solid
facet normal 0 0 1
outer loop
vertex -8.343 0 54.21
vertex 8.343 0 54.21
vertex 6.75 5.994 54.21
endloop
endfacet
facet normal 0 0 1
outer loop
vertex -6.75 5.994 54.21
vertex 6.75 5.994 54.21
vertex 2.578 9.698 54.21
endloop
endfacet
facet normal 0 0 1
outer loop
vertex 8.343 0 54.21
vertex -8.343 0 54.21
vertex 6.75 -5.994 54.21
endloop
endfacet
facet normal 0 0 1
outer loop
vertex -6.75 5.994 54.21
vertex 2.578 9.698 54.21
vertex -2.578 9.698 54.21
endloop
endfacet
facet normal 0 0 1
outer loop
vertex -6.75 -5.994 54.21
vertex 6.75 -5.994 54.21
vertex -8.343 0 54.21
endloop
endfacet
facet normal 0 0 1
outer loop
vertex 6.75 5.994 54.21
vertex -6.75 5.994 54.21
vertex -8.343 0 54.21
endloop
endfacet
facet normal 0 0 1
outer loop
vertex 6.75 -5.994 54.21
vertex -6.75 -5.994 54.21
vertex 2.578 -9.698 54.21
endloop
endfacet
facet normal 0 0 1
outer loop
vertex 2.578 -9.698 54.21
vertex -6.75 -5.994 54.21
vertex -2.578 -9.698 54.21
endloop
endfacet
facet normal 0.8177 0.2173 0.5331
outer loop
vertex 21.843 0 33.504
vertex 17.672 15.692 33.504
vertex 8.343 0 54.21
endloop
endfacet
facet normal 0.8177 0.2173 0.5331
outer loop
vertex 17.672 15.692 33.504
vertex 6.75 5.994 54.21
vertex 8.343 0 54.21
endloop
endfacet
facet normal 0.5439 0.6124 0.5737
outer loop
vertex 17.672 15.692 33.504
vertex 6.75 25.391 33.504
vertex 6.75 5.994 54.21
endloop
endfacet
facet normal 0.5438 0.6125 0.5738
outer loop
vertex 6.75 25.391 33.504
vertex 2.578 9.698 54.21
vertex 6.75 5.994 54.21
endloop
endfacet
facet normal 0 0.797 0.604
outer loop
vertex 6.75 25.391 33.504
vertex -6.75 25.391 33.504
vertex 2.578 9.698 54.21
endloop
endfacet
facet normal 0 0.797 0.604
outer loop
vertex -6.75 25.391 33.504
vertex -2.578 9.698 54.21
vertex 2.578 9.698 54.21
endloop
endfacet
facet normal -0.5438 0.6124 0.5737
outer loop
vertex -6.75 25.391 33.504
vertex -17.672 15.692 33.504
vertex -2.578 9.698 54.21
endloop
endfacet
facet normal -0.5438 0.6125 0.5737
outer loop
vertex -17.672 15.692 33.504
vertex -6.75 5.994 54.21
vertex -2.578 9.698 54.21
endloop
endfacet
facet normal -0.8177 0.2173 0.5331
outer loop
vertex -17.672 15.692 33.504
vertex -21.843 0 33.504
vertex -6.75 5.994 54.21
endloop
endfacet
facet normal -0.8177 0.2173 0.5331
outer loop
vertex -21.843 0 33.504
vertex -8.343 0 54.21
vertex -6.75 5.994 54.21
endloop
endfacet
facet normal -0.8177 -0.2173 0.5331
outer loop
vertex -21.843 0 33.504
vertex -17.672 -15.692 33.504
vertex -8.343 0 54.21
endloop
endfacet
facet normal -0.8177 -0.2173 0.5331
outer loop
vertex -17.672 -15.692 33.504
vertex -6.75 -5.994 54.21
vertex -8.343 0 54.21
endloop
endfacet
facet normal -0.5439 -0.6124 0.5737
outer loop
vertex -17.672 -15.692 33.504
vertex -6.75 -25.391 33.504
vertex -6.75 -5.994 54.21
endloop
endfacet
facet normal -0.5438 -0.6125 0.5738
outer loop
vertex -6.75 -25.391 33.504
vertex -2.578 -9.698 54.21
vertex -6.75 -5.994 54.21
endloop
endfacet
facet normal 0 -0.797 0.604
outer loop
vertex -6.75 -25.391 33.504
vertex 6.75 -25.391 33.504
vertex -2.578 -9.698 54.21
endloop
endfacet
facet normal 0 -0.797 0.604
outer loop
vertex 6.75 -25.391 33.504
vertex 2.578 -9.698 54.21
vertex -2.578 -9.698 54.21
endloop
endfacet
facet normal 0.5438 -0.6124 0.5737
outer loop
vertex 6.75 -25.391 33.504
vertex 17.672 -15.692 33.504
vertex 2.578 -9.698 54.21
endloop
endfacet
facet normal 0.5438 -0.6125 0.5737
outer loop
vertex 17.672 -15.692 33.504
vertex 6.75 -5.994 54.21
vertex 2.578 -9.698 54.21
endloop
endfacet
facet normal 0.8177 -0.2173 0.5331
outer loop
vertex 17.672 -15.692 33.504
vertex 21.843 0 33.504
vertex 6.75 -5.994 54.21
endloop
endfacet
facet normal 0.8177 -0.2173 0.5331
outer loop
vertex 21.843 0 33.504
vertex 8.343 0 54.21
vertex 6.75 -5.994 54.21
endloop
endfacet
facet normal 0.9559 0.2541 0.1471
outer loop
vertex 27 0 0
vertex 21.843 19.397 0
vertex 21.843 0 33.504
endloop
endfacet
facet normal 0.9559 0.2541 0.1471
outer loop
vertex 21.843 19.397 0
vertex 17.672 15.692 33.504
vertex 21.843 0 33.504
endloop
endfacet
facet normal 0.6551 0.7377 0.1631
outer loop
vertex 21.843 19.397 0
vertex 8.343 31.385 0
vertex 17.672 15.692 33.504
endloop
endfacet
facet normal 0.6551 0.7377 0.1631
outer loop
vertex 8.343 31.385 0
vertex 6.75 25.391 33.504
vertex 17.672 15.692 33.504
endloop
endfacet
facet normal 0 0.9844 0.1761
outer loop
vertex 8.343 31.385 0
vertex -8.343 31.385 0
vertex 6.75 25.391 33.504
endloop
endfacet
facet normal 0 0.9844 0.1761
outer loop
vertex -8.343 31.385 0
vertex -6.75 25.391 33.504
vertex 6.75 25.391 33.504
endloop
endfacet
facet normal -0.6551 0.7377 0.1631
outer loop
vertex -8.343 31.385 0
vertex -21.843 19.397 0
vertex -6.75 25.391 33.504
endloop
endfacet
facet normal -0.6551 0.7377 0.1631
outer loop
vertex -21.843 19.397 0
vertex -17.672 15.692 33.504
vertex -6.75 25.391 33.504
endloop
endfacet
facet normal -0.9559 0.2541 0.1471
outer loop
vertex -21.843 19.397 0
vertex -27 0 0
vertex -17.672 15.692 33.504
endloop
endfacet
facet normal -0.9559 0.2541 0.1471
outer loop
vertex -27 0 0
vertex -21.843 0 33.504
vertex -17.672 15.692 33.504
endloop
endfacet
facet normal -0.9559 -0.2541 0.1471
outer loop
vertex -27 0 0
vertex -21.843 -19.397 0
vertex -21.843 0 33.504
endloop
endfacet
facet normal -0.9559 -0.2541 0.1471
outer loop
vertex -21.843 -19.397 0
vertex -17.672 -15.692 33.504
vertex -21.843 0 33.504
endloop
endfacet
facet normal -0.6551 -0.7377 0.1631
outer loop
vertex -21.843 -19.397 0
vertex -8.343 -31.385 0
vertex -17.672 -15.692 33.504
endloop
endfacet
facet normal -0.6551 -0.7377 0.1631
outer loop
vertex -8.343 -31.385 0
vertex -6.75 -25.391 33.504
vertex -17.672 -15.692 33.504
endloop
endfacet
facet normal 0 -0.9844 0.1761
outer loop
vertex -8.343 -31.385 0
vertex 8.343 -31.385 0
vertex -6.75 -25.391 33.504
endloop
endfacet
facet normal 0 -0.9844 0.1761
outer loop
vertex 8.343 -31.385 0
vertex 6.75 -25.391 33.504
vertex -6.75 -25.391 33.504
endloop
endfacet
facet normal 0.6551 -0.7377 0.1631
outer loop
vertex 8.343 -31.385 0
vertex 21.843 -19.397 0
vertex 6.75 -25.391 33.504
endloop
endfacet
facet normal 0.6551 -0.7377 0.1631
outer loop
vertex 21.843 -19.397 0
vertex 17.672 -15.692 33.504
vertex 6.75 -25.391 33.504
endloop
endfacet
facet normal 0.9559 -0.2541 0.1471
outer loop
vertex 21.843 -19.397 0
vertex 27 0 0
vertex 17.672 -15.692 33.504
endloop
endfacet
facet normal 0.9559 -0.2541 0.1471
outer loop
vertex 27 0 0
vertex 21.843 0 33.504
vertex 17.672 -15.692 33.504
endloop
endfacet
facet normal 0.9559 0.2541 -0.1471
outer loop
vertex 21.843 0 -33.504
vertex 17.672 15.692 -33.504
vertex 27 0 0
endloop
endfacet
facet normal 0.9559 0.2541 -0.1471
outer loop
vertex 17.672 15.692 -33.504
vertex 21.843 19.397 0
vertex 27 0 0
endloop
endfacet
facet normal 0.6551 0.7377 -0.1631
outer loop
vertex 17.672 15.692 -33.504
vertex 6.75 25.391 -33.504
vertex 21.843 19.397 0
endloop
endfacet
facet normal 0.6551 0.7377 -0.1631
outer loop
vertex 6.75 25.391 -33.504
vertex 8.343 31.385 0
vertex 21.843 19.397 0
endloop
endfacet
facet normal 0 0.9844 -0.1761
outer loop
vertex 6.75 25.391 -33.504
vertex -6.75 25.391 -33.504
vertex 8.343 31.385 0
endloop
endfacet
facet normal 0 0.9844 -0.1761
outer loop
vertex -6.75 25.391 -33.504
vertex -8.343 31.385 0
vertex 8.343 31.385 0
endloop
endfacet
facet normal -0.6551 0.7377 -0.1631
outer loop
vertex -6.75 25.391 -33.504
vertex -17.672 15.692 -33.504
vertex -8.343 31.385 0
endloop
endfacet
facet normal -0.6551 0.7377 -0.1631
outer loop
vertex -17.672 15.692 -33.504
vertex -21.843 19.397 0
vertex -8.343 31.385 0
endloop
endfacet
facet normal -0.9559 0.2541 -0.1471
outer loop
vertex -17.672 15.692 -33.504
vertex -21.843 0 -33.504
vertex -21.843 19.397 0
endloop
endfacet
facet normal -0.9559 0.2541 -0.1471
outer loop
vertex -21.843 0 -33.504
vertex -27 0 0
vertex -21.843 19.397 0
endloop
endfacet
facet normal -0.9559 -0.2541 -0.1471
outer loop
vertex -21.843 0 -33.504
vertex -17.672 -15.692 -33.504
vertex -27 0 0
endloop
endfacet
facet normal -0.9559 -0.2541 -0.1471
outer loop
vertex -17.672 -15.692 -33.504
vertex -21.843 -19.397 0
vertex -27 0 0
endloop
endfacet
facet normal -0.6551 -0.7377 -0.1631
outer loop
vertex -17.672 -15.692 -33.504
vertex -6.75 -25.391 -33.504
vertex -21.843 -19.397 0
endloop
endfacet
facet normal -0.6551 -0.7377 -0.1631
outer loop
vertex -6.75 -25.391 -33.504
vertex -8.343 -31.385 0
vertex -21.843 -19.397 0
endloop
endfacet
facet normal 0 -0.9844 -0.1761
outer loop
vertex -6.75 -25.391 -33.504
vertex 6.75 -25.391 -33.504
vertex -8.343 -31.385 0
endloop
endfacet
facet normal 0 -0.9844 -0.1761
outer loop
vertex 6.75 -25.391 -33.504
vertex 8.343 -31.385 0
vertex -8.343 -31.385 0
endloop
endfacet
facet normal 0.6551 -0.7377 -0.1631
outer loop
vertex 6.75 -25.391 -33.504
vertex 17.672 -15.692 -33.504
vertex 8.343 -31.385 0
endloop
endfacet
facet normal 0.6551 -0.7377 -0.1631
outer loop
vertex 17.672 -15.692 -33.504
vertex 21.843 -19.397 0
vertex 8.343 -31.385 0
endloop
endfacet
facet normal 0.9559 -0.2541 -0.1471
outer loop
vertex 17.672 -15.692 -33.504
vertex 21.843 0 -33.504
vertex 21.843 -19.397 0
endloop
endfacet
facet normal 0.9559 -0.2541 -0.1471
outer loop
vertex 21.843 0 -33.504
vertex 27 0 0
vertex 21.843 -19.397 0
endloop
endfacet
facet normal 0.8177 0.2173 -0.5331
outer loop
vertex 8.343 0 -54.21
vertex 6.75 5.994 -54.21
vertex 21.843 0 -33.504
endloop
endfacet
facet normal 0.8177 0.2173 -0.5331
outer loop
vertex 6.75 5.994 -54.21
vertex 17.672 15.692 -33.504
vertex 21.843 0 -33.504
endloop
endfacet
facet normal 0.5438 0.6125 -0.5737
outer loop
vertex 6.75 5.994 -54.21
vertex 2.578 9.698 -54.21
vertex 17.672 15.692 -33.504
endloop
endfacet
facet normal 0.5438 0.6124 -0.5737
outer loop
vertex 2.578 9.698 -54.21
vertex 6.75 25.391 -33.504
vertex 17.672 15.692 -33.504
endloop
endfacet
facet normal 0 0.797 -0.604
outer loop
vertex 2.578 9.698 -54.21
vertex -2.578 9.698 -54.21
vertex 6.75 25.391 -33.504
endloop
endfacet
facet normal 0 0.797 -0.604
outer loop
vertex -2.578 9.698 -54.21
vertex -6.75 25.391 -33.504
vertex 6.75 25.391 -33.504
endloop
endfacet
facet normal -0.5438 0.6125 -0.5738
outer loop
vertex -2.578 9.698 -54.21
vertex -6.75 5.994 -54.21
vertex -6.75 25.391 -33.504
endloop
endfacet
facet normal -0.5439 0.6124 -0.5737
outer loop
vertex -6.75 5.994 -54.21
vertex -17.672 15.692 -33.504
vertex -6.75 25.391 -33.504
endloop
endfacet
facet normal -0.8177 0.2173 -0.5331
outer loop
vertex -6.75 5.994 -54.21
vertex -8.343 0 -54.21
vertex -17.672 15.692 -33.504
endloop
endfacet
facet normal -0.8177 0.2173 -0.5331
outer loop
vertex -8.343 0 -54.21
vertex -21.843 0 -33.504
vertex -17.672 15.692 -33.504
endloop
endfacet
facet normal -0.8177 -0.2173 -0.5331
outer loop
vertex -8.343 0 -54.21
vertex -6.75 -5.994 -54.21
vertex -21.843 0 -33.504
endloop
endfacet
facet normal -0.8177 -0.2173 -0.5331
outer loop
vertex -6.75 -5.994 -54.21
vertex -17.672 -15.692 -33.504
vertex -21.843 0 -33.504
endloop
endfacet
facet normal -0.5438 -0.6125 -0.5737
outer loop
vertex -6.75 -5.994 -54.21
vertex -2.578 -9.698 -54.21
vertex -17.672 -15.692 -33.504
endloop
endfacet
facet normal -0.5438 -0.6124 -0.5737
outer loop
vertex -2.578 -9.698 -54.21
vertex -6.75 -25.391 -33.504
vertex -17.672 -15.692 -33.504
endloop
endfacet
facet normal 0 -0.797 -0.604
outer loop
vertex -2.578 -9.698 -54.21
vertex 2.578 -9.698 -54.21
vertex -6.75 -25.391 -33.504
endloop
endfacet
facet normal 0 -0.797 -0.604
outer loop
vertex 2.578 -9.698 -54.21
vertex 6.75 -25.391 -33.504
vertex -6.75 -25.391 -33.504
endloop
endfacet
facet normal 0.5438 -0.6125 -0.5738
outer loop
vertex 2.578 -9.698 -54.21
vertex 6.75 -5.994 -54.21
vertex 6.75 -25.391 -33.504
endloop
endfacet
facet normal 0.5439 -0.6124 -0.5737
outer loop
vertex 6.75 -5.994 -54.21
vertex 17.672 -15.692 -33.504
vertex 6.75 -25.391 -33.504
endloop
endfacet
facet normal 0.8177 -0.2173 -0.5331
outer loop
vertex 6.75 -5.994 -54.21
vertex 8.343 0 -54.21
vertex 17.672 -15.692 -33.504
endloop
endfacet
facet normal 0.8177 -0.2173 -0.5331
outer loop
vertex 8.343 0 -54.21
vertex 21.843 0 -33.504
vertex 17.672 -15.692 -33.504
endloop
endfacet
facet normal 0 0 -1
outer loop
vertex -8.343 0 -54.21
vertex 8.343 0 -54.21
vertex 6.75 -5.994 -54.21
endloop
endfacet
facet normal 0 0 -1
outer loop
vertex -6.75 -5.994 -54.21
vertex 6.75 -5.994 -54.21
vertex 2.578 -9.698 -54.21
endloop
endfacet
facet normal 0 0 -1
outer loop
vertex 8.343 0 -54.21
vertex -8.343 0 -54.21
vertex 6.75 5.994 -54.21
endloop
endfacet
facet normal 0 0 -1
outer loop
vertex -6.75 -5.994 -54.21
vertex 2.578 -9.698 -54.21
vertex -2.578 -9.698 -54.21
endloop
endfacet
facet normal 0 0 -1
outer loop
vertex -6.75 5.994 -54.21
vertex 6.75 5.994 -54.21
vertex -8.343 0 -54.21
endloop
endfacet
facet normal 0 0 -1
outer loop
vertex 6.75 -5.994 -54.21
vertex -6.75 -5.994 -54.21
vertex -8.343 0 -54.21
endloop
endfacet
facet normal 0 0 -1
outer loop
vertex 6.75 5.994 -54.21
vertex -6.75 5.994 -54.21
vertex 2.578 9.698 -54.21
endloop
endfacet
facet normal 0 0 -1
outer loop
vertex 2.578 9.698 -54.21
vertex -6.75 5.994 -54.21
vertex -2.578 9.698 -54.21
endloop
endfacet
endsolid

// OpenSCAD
// Generated by SolidPython 1.0.1 on 2020-07-29 00:46:48


scale(v = [9, 11, 19]) {
	sphere(r = 3);
}
/***********************************************
*********      SolidPython code:      **********
************************************************
 
# import packages: SolidPython
from solid import *
from solid.utils import *
from itertools import chain, combinations, permutations


class Resize:

    def __init__(self, scad_file):
        self.scad_file = scad_file
        #self.scad_file = import_scad(scad_file)
        # cone/cylinder param:
        self.r1 = 0
        self.r2 = 0
        self.h = 0
        # rectangular prism param:
        self.w = 0
        self.l = 0
        # ellipse param:
        self.r = 0

    # import OpenScad code (file name corresponds to shape)


    # classify shape + parameters
    def assign(self, param1, param2, param3):
        if self.scad_file == 'cone.scad':
            self.r1 = param1
            self.r2 = param2
            self.h = param3
        elif self.scad_file == 'cylinder.scad':
            self.r1 = param1
            self.r2 = param2
            self.h = param3
        elif self.scad_file == 'rectangularPrism.scad':
            self.h = param1
            self.l = param2
            self.w = param3
        else:
            self.r = param1
            self.h = param2

    # resize parameters
    def iterate(self):
        x = range(3, 20, 2)
        i = 1
        if self.scad_file == 'cone.scad':
            tempList = list(permutations(x, 2))
            for temp in tempList:
                param1 = temp[0]
                param2 = temp[1]
                filepath = 'produced_scad_files/' + 'cone' + str(param1) + '_' + str(param2) + '_' + '.scad'
                scad_render_to_file(cylinder(h=param1, r1=param2, r2=0), filepath)

        elif self.scad_file == 'cylinder.scad':
            tempList = list(permutations(x, 3))
            for temp in tempList:
                param1 = temp[0]
                param2 = temp[1]
                filepath = 'produced_scad_files/' + 'cylinder' + str(param1) + '_' + str(param2) + '_' + '.scad'
                scad_render_to_file(cylinder(h=param1, r1=param2, r2=param2), filepath)

        elif self.scad_file == 'rectangularPrism.scad':
            tempList = list(permutations(x, 3))
            for temp in tempList:
                param1 = temp[0]
                param2 = temp[1]
                param3 = temp[2]
                filepath = 'produced_scad_files/' + 'rectangularPrism' + str(param1) + '_' + str(param2) + '_' + str(
                    param3) + '.scad'
                scad_render_to_file(cube(size=(param1, param2, param3)), filepath)

        elif self.scad_file == 'ellipse.scad':
            tempList = list(permutations(x, 4))
            for temp in tempList:
                param1 = temp[0]
                param2 = temp[1]
                param3 = temp[2]
                param4 = temp[3]
                filepath = 'produced_scad_files/' + 'ellipse' + str(param1) + '_' + str(param2) + '_' + str(param3) + '_' + str(param4) + '.scad'
                scad_render_to_file(scale([param1, param2, param3])(sphere(r=param4)), filepath)

    def render_to_scadfile(self):
        scad_render_to_file(scad, 'example.scad') 
 
************************************************/
